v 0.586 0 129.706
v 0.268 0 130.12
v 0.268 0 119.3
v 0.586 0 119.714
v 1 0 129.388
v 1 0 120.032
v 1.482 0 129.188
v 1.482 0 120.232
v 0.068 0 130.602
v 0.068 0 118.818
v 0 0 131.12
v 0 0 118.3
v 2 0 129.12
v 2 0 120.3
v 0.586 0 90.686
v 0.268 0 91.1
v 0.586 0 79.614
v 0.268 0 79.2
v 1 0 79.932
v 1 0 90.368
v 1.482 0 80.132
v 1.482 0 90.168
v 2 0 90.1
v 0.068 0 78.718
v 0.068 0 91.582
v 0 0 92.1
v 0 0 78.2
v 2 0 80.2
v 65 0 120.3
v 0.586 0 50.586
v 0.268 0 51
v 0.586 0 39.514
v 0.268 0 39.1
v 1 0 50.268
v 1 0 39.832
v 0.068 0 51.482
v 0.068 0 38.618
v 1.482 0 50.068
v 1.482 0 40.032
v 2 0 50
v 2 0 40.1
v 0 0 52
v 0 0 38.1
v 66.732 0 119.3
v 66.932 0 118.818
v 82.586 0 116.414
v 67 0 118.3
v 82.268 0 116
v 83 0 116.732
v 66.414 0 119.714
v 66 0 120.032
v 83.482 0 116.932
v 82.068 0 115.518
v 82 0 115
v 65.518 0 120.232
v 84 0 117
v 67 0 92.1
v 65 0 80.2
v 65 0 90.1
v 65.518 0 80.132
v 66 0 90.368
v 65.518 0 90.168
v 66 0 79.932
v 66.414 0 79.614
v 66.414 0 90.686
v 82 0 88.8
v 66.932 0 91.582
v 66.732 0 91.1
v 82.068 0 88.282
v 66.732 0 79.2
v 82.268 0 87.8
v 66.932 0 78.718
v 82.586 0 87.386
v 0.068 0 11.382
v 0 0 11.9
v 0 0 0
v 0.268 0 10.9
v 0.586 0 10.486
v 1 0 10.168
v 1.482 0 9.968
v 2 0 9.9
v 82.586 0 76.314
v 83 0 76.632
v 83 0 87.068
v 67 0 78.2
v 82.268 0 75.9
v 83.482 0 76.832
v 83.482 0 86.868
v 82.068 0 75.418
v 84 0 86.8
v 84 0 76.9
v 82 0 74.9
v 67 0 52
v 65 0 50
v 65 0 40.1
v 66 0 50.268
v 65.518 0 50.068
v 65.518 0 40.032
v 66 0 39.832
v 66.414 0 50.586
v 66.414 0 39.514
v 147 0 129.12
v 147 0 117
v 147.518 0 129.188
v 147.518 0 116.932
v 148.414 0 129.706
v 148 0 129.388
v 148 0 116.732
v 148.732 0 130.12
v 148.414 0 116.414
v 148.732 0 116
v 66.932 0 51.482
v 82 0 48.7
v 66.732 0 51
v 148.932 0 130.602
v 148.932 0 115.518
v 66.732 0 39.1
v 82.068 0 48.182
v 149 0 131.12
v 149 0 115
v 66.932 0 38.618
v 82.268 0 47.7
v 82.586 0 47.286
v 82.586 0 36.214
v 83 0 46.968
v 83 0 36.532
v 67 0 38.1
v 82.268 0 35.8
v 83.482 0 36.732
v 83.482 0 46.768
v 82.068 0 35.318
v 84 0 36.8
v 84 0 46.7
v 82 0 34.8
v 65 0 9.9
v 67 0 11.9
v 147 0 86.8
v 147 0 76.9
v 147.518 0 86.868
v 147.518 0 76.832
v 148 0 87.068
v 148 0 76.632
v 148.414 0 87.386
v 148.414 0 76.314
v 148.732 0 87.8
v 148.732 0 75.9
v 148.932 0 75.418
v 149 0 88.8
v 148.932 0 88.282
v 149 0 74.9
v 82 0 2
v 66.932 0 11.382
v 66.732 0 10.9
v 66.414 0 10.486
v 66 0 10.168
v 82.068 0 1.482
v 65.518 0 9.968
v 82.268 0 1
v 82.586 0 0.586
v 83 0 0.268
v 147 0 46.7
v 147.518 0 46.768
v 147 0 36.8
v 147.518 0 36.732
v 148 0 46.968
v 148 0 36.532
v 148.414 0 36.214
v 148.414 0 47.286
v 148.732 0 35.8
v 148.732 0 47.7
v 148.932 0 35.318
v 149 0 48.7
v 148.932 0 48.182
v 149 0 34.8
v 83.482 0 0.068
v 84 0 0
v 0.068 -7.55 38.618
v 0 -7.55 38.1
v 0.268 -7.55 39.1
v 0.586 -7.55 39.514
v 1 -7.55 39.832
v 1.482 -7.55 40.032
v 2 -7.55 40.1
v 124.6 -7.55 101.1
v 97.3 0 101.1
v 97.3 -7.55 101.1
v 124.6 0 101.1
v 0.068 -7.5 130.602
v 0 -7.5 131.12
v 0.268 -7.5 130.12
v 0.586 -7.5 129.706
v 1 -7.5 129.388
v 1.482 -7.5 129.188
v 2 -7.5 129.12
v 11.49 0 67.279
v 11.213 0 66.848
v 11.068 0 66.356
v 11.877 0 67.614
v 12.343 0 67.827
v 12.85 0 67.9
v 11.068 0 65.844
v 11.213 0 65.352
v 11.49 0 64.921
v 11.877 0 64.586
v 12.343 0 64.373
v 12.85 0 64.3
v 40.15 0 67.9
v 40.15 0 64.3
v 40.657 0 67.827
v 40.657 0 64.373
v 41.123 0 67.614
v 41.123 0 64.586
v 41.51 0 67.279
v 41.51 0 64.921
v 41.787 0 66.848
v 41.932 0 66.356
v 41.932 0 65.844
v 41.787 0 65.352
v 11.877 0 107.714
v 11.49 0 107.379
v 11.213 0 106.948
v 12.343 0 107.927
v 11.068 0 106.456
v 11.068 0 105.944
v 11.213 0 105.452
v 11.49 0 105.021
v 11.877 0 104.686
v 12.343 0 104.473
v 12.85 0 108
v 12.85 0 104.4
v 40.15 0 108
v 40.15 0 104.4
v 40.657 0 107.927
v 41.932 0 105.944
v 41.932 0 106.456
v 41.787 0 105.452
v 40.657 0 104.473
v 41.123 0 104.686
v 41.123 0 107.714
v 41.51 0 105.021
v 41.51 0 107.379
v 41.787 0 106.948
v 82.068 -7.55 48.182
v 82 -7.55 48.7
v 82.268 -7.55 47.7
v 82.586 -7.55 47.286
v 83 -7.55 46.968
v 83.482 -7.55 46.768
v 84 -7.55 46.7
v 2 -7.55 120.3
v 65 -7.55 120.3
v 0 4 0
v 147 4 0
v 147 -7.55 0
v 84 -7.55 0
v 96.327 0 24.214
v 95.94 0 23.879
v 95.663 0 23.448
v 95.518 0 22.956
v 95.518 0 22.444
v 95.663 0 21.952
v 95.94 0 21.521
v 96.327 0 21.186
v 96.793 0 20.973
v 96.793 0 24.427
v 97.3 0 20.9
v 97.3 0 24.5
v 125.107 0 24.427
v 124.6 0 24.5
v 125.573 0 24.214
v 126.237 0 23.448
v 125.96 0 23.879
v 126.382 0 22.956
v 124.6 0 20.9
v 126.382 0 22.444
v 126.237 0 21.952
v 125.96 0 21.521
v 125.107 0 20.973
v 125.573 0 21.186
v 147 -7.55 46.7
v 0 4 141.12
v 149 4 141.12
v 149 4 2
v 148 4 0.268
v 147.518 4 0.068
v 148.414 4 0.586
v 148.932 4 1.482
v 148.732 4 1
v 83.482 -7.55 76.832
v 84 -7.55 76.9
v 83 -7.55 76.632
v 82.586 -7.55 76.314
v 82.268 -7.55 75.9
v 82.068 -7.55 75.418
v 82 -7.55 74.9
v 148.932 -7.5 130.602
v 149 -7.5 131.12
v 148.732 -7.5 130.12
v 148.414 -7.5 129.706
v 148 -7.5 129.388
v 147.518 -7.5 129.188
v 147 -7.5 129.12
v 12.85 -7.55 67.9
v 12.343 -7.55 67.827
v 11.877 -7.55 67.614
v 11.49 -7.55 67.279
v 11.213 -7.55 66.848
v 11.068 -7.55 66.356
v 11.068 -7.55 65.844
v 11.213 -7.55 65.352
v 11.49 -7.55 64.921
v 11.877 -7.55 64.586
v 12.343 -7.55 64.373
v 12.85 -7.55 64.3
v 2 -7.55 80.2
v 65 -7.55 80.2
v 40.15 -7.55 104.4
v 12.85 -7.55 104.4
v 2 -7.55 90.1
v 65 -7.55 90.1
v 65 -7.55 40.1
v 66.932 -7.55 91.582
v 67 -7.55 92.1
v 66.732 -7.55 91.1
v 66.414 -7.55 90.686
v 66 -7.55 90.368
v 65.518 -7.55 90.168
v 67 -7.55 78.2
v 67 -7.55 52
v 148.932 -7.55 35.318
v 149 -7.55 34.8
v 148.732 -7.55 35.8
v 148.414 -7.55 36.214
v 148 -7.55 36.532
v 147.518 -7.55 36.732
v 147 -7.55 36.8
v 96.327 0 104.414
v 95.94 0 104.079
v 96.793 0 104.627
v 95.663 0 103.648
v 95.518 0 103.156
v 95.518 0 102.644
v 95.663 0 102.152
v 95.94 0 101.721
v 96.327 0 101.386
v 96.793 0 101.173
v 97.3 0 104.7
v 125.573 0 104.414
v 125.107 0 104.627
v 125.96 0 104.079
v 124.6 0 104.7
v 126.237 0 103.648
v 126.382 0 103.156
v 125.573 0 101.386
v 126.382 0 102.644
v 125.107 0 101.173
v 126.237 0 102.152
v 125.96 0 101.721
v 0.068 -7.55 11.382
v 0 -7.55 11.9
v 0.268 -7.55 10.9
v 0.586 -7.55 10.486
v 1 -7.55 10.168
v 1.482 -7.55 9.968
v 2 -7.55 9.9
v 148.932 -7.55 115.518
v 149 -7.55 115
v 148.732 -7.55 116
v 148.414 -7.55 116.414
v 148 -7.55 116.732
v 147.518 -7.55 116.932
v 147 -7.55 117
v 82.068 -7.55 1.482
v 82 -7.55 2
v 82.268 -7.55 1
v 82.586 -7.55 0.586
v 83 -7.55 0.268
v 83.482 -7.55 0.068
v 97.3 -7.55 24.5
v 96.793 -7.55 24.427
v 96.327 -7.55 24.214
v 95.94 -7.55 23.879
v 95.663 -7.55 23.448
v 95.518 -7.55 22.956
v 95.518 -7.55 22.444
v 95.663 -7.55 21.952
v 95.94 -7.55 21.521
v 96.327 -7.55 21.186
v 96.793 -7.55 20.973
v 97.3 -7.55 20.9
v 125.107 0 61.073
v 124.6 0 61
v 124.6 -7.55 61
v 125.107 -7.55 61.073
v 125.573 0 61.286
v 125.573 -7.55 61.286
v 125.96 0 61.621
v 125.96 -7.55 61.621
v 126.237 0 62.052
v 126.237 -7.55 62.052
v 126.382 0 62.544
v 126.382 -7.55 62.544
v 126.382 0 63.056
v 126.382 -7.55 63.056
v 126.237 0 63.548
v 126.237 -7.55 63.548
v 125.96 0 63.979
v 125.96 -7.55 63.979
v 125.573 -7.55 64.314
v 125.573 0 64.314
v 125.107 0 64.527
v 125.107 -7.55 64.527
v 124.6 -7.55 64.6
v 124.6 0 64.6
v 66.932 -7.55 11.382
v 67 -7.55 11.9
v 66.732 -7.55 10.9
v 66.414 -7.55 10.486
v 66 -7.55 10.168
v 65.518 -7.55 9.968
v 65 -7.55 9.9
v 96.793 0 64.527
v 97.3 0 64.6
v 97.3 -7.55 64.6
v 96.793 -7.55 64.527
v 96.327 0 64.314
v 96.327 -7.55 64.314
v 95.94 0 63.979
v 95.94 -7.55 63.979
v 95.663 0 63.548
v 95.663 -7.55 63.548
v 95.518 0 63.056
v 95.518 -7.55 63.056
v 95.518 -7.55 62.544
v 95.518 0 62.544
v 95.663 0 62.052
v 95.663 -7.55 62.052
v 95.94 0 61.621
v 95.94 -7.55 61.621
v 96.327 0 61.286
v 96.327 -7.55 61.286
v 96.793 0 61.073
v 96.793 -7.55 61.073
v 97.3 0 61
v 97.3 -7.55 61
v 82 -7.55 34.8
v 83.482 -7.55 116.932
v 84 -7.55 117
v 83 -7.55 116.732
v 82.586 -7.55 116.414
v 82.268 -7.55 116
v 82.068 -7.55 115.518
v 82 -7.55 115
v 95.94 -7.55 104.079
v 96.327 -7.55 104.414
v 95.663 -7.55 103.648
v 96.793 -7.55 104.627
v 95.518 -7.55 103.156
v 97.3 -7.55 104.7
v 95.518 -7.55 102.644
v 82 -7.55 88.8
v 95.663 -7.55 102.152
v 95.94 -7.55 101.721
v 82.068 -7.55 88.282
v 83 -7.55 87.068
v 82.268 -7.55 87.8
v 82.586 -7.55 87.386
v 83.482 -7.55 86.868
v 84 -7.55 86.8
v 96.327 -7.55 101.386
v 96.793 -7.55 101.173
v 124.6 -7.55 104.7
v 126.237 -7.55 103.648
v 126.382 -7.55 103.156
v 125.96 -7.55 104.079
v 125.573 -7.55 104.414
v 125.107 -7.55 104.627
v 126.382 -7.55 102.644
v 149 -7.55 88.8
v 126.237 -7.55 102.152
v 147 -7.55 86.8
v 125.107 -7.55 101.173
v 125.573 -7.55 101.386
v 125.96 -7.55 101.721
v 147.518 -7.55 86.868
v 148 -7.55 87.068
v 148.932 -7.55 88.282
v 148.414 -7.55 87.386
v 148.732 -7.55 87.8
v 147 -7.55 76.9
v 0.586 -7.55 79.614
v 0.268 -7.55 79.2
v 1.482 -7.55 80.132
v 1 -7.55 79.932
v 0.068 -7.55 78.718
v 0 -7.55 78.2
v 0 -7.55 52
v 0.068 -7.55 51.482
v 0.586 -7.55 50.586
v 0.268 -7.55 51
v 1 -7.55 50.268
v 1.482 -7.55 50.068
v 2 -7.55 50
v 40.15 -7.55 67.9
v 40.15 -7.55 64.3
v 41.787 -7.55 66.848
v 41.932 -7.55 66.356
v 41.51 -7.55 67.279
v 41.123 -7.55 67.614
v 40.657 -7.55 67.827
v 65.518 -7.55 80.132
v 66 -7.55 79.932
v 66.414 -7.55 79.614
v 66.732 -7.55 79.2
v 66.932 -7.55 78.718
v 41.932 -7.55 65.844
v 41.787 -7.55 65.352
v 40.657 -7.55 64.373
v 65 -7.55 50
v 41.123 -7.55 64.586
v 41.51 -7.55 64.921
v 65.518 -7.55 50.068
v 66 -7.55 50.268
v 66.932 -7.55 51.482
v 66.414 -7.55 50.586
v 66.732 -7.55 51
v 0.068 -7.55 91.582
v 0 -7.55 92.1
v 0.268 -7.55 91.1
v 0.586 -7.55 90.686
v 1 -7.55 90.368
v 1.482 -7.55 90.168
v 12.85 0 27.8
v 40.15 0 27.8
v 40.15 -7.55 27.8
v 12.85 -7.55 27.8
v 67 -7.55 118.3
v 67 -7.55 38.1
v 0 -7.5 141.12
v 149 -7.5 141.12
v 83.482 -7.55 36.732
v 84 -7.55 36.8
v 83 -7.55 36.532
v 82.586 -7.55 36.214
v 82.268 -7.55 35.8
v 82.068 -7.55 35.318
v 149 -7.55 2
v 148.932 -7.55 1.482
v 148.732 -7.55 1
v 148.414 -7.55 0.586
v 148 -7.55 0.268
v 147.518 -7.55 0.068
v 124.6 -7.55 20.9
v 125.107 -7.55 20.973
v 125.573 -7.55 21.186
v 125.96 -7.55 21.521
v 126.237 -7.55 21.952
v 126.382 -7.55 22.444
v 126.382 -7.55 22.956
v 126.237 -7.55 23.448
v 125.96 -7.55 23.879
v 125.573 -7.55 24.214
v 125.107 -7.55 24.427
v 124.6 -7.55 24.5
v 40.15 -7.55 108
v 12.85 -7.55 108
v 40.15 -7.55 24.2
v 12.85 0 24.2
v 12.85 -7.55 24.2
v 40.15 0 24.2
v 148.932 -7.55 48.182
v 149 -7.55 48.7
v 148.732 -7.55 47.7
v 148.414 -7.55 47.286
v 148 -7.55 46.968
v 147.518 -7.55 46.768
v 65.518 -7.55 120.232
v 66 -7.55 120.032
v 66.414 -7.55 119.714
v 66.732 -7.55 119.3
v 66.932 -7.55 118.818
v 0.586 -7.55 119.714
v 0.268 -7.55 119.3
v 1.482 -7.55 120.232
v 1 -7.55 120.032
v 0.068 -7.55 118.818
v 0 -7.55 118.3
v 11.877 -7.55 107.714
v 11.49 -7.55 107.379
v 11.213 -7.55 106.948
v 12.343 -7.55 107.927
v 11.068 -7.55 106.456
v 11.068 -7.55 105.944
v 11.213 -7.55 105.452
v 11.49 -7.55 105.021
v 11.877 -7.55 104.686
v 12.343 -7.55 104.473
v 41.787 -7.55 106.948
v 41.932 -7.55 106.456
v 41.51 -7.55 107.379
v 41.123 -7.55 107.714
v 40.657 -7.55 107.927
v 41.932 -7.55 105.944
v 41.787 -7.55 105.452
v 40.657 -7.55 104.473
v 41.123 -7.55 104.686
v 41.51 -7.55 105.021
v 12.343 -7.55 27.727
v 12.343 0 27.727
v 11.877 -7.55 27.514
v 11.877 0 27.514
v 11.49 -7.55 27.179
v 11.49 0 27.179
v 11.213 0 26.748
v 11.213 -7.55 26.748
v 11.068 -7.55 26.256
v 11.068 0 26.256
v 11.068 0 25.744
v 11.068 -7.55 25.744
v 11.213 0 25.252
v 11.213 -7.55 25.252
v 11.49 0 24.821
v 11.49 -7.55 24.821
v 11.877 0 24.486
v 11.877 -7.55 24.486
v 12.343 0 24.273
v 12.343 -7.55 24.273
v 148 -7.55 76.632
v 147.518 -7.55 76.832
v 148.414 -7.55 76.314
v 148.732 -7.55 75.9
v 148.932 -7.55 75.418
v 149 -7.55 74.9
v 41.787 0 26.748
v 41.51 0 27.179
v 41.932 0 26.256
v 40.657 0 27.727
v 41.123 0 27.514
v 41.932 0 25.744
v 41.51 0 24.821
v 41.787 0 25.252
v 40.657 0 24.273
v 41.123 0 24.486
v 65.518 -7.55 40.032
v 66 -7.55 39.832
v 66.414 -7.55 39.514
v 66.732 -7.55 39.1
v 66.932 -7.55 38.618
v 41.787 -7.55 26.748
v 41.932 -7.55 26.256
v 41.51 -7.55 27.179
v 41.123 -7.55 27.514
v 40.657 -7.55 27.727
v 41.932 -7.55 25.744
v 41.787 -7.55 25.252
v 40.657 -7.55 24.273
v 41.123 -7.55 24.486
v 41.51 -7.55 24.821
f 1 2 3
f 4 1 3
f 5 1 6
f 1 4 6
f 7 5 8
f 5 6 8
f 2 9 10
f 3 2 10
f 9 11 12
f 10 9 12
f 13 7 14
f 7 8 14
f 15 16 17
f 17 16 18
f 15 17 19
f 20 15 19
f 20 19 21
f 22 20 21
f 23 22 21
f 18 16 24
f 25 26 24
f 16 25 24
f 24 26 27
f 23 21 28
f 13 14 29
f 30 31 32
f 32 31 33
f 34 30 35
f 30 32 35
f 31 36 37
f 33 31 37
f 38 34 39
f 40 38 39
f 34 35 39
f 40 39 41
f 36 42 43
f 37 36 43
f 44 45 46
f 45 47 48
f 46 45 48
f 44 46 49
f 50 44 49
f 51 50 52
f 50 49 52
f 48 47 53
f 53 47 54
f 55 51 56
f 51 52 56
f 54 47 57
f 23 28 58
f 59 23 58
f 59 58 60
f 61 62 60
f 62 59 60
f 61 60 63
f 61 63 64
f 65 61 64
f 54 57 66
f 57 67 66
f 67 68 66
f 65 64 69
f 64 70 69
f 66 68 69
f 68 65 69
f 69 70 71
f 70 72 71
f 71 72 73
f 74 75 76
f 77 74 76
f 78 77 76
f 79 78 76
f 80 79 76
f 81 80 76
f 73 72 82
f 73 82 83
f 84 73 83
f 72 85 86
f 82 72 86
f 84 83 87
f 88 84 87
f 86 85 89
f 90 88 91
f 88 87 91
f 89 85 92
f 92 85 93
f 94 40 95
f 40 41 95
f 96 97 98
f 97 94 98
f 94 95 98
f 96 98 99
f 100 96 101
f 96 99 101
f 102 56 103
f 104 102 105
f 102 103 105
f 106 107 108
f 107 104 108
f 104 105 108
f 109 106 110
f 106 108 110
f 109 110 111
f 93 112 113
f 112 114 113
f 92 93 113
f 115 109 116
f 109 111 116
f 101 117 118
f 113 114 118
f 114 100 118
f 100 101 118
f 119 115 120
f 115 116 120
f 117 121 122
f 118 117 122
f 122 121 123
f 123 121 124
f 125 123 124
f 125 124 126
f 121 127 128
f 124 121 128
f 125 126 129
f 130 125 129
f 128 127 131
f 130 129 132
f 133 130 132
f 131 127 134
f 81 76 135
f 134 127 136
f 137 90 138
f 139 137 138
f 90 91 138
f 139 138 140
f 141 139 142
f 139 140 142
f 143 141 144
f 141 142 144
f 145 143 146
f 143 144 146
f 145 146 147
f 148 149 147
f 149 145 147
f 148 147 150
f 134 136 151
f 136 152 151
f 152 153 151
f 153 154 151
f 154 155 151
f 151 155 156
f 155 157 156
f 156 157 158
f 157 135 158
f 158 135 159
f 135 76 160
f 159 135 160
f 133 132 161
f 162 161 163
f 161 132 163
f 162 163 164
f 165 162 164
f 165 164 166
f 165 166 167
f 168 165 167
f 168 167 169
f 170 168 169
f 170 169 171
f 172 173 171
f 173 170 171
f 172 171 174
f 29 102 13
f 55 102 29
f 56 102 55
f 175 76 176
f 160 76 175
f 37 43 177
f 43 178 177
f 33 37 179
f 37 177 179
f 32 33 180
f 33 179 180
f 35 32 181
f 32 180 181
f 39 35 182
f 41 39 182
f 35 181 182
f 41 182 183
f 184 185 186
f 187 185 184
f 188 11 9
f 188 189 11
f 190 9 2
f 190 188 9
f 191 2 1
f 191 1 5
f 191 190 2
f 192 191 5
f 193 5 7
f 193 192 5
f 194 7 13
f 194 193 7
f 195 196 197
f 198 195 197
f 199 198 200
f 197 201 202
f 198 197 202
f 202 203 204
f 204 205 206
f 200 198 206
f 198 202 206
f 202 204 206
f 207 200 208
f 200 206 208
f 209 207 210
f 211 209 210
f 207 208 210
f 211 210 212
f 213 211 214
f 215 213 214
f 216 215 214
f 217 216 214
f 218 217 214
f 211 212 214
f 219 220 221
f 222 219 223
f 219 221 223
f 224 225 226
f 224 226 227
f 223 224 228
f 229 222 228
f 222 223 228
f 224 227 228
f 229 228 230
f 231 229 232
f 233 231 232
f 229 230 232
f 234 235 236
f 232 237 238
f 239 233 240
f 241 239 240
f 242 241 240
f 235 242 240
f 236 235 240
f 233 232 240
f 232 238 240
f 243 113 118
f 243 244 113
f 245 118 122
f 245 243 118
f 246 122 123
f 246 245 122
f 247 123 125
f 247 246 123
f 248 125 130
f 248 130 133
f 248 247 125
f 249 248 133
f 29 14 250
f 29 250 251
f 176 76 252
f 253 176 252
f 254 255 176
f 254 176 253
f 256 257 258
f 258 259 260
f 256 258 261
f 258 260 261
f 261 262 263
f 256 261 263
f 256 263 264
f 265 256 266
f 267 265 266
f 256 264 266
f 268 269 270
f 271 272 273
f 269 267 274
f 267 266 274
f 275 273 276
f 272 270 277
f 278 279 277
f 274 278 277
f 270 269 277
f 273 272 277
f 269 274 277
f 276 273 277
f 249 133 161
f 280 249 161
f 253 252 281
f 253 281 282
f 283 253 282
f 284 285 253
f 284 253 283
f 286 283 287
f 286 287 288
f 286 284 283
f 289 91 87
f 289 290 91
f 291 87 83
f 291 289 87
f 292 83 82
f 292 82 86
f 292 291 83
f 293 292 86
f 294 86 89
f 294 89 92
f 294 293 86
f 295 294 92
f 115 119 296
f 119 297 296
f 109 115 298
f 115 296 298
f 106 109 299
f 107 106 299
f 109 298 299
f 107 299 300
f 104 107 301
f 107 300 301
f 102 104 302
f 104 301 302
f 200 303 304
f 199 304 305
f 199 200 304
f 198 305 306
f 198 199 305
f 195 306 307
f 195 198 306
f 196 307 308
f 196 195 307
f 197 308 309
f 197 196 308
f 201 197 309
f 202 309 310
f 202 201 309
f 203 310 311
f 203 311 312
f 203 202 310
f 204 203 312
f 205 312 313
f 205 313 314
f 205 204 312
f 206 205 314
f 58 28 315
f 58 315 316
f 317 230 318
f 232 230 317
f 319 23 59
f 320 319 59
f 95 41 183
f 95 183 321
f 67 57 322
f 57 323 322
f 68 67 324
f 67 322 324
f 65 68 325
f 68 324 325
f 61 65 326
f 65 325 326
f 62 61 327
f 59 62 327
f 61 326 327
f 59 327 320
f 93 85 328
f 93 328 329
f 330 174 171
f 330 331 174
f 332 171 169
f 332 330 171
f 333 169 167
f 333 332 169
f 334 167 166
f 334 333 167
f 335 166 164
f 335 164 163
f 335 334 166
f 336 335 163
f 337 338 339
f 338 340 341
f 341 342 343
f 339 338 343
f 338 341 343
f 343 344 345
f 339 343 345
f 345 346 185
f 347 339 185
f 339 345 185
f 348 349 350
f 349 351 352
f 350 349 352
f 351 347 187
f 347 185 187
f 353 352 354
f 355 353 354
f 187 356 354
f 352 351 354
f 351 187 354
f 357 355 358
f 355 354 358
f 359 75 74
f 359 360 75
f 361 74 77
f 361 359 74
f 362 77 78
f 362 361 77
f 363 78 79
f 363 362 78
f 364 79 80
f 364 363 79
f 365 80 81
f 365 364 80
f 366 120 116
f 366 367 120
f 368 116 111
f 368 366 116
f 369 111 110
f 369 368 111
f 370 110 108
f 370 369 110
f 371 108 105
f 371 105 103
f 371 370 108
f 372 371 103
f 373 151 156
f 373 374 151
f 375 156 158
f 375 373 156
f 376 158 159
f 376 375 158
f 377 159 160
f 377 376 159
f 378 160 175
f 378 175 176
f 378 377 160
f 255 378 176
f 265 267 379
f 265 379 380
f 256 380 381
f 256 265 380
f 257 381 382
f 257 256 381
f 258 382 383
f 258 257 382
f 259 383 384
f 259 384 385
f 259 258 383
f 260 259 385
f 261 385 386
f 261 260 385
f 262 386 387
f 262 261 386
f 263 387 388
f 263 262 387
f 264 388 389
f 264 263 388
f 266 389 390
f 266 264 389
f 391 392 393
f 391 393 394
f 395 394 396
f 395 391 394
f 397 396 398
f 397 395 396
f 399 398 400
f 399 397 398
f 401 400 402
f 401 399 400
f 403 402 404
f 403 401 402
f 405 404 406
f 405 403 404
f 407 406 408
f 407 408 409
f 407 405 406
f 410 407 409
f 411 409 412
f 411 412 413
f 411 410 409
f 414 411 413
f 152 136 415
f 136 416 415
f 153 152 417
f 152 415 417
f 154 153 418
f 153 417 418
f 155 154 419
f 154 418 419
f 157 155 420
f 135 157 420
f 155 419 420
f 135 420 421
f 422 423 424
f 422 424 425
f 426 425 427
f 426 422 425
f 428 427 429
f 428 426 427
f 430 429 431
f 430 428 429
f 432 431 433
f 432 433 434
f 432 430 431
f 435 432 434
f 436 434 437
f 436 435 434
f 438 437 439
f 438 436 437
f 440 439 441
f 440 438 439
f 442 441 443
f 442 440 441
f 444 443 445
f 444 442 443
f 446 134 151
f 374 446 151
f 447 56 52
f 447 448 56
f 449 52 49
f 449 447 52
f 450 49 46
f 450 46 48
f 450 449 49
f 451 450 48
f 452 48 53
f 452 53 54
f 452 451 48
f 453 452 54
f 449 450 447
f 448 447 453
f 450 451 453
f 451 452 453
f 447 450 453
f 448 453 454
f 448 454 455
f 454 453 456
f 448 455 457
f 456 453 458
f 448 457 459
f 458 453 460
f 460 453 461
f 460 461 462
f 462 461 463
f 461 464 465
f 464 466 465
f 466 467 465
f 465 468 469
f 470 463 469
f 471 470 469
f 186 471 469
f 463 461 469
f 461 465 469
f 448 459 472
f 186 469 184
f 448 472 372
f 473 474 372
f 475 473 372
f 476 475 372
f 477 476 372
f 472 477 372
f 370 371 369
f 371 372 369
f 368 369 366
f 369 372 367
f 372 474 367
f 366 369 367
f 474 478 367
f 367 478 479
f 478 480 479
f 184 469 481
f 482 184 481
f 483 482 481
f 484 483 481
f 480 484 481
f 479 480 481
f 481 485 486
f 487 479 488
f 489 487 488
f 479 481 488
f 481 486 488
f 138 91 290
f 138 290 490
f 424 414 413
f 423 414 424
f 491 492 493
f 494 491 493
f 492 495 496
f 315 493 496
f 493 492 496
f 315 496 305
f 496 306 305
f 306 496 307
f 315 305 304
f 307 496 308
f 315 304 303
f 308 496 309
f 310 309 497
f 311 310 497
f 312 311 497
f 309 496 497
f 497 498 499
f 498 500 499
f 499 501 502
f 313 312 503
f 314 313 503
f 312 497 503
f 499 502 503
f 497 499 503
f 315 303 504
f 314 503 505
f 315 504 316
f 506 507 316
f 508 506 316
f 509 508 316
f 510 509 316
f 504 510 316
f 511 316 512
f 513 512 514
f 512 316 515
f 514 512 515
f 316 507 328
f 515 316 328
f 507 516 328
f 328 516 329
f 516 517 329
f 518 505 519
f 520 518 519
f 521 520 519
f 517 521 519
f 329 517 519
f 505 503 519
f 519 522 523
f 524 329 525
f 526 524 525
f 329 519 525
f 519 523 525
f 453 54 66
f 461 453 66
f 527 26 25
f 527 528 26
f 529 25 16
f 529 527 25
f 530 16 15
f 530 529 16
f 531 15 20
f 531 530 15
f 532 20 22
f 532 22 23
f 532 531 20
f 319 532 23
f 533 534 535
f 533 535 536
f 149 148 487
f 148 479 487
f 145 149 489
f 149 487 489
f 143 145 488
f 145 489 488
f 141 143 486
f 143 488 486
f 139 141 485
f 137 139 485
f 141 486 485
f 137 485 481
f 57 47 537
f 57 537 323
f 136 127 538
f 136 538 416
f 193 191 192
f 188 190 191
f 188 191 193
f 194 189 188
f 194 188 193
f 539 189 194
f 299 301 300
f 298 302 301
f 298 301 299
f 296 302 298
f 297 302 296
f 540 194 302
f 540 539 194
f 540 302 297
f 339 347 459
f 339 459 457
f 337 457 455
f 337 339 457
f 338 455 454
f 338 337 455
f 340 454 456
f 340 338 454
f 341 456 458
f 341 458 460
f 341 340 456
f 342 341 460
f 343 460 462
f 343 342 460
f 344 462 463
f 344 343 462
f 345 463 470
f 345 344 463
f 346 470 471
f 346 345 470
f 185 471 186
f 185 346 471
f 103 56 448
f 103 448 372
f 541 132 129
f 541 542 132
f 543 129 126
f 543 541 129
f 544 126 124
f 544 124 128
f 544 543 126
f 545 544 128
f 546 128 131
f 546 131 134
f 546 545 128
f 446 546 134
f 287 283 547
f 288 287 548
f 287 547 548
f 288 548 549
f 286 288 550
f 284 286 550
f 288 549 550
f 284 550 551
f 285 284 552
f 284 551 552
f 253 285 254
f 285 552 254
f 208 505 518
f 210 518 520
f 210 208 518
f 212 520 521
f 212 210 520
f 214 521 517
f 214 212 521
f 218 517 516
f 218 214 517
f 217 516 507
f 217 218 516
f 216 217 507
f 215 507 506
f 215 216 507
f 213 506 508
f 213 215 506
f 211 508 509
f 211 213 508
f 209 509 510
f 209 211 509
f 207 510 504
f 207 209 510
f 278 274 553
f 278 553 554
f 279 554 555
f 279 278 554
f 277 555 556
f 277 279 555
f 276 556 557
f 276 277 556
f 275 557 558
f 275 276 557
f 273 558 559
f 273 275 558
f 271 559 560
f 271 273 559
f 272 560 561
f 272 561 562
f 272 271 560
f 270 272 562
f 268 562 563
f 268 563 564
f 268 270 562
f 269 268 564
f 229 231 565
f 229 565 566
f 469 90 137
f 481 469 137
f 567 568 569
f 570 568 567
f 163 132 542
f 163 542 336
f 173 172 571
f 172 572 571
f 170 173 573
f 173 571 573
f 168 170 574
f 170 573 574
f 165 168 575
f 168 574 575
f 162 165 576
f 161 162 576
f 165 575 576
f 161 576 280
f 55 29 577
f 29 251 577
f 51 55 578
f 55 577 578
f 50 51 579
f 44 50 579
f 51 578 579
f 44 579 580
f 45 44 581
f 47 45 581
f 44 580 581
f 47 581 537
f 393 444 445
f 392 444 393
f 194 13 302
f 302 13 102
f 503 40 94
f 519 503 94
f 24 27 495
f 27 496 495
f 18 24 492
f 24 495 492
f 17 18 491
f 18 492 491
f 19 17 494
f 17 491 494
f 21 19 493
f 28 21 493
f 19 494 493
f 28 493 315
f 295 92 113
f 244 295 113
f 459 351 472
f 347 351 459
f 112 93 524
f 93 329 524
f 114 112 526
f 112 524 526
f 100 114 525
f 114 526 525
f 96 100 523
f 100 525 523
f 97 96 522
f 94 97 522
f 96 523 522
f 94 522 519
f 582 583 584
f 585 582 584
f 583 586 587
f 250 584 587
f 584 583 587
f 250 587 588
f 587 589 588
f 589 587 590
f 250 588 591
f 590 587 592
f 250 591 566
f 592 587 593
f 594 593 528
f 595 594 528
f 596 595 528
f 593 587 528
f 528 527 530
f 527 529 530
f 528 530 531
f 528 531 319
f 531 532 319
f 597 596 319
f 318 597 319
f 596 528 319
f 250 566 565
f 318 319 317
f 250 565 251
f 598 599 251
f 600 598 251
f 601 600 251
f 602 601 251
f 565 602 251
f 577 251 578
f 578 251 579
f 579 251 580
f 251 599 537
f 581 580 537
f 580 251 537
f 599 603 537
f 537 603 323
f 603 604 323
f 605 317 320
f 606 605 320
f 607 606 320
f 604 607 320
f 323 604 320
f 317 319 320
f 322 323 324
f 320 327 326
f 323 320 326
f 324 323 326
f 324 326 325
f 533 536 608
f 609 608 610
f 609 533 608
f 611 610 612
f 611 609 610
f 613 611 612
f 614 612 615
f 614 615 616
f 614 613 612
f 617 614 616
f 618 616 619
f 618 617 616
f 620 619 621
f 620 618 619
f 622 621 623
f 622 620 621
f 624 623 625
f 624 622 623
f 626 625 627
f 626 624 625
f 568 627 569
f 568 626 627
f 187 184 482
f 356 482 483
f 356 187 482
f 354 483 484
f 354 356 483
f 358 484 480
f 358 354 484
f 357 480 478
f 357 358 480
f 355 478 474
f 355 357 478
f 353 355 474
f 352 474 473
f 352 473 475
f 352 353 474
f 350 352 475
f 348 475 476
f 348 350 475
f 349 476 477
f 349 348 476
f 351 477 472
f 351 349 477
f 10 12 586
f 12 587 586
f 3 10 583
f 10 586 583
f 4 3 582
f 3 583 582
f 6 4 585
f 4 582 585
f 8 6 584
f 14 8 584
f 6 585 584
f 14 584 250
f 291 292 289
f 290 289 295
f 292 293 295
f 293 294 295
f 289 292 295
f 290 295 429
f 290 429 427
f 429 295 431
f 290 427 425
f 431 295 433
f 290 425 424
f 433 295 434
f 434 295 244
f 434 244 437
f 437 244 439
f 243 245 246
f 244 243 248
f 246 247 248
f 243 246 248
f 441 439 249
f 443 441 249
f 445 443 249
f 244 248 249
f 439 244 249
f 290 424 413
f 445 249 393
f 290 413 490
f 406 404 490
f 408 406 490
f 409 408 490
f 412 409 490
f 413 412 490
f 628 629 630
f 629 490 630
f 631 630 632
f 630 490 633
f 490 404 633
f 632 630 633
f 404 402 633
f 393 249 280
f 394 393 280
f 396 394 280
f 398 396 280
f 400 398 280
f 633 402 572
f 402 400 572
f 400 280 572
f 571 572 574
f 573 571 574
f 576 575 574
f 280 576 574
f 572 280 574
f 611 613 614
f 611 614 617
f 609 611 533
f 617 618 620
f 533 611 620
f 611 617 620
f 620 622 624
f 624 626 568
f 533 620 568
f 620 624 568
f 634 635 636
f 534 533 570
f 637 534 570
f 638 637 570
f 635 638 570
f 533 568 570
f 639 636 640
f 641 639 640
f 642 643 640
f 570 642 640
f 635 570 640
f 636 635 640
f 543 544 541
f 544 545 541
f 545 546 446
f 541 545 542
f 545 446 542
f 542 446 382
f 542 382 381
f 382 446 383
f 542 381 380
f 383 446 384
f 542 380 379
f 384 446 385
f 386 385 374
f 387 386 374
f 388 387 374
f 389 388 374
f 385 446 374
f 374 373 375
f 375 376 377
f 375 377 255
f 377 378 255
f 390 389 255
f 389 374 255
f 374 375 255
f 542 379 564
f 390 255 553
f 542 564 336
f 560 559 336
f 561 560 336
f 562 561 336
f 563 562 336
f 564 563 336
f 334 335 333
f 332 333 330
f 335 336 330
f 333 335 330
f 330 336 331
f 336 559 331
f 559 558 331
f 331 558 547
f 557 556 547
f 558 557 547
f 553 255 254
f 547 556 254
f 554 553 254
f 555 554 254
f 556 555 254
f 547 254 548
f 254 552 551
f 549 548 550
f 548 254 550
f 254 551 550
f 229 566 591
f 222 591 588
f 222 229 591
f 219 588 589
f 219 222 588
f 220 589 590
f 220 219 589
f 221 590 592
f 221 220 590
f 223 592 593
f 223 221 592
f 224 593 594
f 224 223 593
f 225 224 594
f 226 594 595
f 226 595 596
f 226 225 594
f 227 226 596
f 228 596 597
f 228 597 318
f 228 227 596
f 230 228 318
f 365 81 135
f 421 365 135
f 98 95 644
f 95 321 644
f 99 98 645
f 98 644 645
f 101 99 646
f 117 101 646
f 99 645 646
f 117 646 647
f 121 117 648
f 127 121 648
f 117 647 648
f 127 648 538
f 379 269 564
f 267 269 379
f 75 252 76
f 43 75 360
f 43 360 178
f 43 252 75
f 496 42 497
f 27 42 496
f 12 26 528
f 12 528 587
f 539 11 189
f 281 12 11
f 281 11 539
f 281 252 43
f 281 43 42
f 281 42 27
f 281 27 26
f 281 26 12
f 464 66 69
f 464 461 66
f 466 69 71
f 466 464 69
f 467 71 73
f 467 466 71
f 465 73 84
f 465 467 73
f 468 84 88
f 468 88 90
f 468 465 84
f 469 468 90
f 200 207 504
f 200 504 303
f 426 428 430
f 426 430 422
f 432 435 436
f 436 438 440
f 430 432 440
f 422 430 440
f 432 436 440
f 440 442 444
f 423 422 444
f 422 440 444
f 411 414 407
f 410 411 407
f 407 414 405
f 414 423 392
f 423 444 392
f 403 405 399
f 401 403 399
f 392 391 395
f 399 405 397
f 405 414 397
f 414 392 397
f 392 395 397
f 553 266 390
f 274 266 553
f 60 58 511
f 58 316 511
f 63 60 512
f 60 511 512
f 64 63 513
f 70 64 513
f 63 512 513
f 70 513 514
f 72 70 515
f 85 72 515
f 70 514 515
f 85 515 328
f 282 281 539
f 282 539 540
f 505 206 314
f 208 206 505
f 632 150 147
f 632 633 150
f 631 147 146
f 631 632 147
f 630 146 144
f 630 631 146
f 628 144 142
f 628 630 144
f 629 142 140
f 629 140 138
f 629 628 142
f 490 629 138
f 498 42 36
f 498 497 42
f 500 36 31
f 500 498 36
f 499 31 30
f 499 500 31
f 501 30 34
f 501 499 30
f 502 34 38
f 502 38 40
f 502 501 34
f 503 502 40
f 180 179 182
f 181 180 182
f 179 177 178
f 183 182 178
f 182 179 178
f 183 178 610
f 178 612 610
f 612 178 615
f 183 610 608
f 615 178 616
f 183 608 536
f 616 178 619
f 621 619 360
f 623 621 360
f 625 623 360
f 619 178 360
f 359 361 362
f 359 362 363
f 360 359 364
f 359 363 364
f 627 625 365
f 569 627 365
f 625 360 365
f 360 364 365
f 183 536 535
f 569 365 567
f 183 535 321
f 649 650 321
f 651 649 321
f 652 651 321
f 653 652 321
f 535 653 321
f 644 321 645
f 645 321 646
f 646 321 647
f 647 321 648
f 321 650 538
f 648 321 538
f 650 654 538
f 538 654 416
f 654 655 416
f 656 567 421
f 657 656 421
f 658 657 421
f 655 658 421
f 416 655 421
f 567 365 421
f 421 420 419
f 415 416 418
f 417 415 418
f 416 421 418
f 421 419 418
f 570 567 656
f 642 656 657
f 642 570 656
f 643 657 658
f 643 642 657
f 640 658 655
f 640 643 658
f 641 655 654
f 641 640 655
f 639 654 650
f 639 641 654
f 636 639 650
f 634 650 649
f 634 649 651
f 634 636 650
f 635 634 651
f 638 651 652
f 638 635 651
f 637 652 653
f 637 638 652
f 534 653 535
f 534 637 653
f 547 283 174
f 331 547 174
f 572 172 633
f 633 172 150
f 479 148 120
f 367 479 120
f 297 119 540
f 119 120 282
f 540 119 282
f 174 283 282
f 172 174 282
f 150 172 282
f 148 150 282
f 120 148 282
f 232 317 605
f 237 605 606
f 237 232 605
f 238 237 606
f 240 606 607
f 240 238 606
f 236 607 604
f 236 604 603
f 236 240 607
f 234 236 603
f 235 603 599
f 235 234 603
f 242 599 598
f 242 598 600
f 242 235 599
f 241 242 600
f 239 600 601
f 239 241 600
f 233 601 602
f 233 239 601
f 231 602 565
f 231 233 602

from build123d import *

# Parameters (mm, degrees)
SKETCH3_W           = 149
SKETCH3_H           = 141.12
BOSS_EXTRUDE1_DEPTH = 4
SKETCH5_W           = 67
SKETCH5_H           = 30.2
SKETCH5_H_2         = 36.8
BOSS_EXTRUDE2_DEPTH = 11.55
FILLET1_R           = 2
SKETCH6_W           = 149
SKETCH6_H           = 12
BOSS_EXTRUDE3_DEPTH = 7.5
FILLET2_R           = 2


with BuildPart() as part:
    # Sketch3 → Boss-Extrude1 (new body)
    with BuildSketch(Plane(origin=(0, 0, 0), x_dir=(1, 0, 0), z_dir=(0, 1, 0))):
        with Locations((74.5, -70.56)):
            Rectangle(SKETCH3_W, SKETCH3_H)
    extrude(amount=BOSS_EXTRUDE1_DEPTH)

    # Sketch5 → Boss-Extrude2 (add)
    # profile 1 of 6: a face of its own
    with BuildSketch(Plane(origin=(0, 4, 0), x_dir=(1, 0, 0), z_dir=(0, 1, 0))):
        with Locations((33.5, -25)):
            Rectangle(SKETCH5_W, SKETCH5_H)
        with BuildLine():
            ThreePointArc((12.85, -27.8), (11.05, -26), (12.85, -24.2))
            Line((12.85, -24.2), (40.15, -24.2))
            ThreePointArc((40.15, -24.2), (41.95, -26), (40.15, -27.8))
            Line((40.15, -27.8), (12.85, -27.8))
        make_face(mode=Mode.SUBTRACT)
    # profile 2 of 6: a face of its own
    with BuildSketch(Plane(origin=(0, 4, 0), x_dir=(1, 0, 0), z_dir=(0, 1, 0))):
        with Locations((115.5, -18.4)):
            Rectangle(SKETCH5_W, SKETCH5_H_2)
        with BuildLine():
            ThreePointArc((97.3, -24.5), (95.5, -22.7), (97.3, -20.9))
            Line((97.3, -20.9), (124.6, -20.9))
            ThreePointArc((124.6, -20.9), (126.4, -22.7), (124.6, -24.5))
            Line((124.6, -24.5), (97.3, -24.5))
        make_face(mode=Mode.SUBTRACT)
    # profile 3 of 6: a face of its own
    with BuildSketch(Plane(origin=(0, 4, 0), x_dir=(1, 0, 0), z_dir=(0, 1, 0))):
        with Locations((33.5, -65.1)):
            Rectangle(SKETCH5_W, SKETCH5_H)
        with BuildLine():
            ThreePointArc((12.85, -67.9), (11.05, -66.1), (12.85, -64.3))
            Line((12.85, -64.3), (40.15, -64.3))
            ThreePointArc((40.15, -64.3), (41.95, -66.1), (40.15, -67.9))
            Line((40.15, -67.9), (12.85, -67.9))
        make_face(mode=Mode.SUBTRACT)
    # profile 4 of 6: a face of its own
    with BuildSketch(Plane(origin=(0, 4, 0), x_dir=(1, 0, 0), z_dir=(0, 1, 0))):
        with Locations((115.5, -61.8)):
            Rectangle(SKETCH5_W, SKETCH5_H)
        with BuildLine():
            ThreePointArc((97.3, -64.6), (95.5, -62.8), (97.3, -61))
            Line((97.3, -61), (124.6, -61))
            ThreePointArc((124.6, -61), (126.4, -62.8), (124.6, -64.6))
            Line((124.6, -64.6), (97.3, -64.6))
        make_face(mode=Mode.SUBTRACT)
    # profile 5 of 6: a face of its own
    with BuildSketch(Plane(origin=(0, 4, 0), x_dir=(1, 0, 0), z_dir=(0, 1, 0))):
        with Locations((33.5, -105.2)):
            Rectangle(SKETCH5_W, SKETCH5_H)
        with BuildLine():
            ThreePointArc((12.85, -108), (11.05, -106.2), (12.85, -104.4))
            Line((12.85, -104.4), (40.15, -104.4))
            ThreePointArc((40.15, -104.4), (41.95, -106.2), (40.15, -108))
            Line((40.15, -108), (12.85, -108))
        make_face(mode=Mode.SUBTRACT)
    # profile 6 of 6: a face of its own
    with BuildSketch(Plane(origin=(0, 4, 0), x_dir=(1, 0, 0), z_dir=(0, 1, 0))):
        with Locations((115.5, -101.9)):
            Rectangle(SKETCH5_W, SKETCH5_H)
        with BuildLine():
            ThreePointArc((97.3, -104.7), (95.5, -102.9), (97.3, -101.1))
            Line((97.3, -101.1), (124.6, -101.1))
            ThreePointArc((124.6, -101.1), (126.4, -102.9), (124.6, -104.7))
            Line((124.6, -104.7), (97.3, -104.7))
        make_face(mode=Mode.SUBTRACT)
    extrude(amount=-BOSS_EXTRUDE2_DEPTH)

    # Fillet1
    fillet1_edges = [part.edges().sort_by_distance(p)[0] for p in [
        (67, -3.775, 50),
        (67, -3.775, 80.2),
        (0, -3.775, 80.2),
        (0, -3.775, 50),
        (82, -3.775, 46.7),
        (149, -3.775, 46.7),
        (149, -3.775, 76.9),
        (82, -3.775, 76.9),
        (67, -3.775, 90.1),
        (67, -3.775, 120.3),
        (0, -3.775, 120.3),
        (0, -3.775, 90.1),
        (82, -3.775, 86.8),
        (149, -3.775, 86.8),
        (149, -3.775, 117),
        (82, -3.775, 117),
        (67, -3.775, 9.9),
        (67, -3.775, 40.1),
        (0, -3.775, 40.1),
        (0, -3.775, 9.9),
        (82, -3.775, 0),
        (149, -3.775, 36.8),
        (82, -3.775, 36.8),
        (149, -1.775, 0),
    ]]
    fillet(fillet1_edges, radius=FILLET1_R)

    # Sketch6 → Boss-Extrude3 (add)
    with BuildSketch(Plane.XZ):
        with Locations((74.5, 135.12)):
            Rectangle(SKETCH6_W, SKETCH6_H)
    extrude(amount=BOSS_EXTRUDE3_DEPTH)

    # Fillet2
    fillet2_edges = [part.edges().sort_by_distance(p)[0] for p in [
        (0, -3.75, 129.12),
        (149, -3.75, 129.12),
    ]]
    fillet(fillet2_edges, radius=FILLET2_R)


solid = part.part
